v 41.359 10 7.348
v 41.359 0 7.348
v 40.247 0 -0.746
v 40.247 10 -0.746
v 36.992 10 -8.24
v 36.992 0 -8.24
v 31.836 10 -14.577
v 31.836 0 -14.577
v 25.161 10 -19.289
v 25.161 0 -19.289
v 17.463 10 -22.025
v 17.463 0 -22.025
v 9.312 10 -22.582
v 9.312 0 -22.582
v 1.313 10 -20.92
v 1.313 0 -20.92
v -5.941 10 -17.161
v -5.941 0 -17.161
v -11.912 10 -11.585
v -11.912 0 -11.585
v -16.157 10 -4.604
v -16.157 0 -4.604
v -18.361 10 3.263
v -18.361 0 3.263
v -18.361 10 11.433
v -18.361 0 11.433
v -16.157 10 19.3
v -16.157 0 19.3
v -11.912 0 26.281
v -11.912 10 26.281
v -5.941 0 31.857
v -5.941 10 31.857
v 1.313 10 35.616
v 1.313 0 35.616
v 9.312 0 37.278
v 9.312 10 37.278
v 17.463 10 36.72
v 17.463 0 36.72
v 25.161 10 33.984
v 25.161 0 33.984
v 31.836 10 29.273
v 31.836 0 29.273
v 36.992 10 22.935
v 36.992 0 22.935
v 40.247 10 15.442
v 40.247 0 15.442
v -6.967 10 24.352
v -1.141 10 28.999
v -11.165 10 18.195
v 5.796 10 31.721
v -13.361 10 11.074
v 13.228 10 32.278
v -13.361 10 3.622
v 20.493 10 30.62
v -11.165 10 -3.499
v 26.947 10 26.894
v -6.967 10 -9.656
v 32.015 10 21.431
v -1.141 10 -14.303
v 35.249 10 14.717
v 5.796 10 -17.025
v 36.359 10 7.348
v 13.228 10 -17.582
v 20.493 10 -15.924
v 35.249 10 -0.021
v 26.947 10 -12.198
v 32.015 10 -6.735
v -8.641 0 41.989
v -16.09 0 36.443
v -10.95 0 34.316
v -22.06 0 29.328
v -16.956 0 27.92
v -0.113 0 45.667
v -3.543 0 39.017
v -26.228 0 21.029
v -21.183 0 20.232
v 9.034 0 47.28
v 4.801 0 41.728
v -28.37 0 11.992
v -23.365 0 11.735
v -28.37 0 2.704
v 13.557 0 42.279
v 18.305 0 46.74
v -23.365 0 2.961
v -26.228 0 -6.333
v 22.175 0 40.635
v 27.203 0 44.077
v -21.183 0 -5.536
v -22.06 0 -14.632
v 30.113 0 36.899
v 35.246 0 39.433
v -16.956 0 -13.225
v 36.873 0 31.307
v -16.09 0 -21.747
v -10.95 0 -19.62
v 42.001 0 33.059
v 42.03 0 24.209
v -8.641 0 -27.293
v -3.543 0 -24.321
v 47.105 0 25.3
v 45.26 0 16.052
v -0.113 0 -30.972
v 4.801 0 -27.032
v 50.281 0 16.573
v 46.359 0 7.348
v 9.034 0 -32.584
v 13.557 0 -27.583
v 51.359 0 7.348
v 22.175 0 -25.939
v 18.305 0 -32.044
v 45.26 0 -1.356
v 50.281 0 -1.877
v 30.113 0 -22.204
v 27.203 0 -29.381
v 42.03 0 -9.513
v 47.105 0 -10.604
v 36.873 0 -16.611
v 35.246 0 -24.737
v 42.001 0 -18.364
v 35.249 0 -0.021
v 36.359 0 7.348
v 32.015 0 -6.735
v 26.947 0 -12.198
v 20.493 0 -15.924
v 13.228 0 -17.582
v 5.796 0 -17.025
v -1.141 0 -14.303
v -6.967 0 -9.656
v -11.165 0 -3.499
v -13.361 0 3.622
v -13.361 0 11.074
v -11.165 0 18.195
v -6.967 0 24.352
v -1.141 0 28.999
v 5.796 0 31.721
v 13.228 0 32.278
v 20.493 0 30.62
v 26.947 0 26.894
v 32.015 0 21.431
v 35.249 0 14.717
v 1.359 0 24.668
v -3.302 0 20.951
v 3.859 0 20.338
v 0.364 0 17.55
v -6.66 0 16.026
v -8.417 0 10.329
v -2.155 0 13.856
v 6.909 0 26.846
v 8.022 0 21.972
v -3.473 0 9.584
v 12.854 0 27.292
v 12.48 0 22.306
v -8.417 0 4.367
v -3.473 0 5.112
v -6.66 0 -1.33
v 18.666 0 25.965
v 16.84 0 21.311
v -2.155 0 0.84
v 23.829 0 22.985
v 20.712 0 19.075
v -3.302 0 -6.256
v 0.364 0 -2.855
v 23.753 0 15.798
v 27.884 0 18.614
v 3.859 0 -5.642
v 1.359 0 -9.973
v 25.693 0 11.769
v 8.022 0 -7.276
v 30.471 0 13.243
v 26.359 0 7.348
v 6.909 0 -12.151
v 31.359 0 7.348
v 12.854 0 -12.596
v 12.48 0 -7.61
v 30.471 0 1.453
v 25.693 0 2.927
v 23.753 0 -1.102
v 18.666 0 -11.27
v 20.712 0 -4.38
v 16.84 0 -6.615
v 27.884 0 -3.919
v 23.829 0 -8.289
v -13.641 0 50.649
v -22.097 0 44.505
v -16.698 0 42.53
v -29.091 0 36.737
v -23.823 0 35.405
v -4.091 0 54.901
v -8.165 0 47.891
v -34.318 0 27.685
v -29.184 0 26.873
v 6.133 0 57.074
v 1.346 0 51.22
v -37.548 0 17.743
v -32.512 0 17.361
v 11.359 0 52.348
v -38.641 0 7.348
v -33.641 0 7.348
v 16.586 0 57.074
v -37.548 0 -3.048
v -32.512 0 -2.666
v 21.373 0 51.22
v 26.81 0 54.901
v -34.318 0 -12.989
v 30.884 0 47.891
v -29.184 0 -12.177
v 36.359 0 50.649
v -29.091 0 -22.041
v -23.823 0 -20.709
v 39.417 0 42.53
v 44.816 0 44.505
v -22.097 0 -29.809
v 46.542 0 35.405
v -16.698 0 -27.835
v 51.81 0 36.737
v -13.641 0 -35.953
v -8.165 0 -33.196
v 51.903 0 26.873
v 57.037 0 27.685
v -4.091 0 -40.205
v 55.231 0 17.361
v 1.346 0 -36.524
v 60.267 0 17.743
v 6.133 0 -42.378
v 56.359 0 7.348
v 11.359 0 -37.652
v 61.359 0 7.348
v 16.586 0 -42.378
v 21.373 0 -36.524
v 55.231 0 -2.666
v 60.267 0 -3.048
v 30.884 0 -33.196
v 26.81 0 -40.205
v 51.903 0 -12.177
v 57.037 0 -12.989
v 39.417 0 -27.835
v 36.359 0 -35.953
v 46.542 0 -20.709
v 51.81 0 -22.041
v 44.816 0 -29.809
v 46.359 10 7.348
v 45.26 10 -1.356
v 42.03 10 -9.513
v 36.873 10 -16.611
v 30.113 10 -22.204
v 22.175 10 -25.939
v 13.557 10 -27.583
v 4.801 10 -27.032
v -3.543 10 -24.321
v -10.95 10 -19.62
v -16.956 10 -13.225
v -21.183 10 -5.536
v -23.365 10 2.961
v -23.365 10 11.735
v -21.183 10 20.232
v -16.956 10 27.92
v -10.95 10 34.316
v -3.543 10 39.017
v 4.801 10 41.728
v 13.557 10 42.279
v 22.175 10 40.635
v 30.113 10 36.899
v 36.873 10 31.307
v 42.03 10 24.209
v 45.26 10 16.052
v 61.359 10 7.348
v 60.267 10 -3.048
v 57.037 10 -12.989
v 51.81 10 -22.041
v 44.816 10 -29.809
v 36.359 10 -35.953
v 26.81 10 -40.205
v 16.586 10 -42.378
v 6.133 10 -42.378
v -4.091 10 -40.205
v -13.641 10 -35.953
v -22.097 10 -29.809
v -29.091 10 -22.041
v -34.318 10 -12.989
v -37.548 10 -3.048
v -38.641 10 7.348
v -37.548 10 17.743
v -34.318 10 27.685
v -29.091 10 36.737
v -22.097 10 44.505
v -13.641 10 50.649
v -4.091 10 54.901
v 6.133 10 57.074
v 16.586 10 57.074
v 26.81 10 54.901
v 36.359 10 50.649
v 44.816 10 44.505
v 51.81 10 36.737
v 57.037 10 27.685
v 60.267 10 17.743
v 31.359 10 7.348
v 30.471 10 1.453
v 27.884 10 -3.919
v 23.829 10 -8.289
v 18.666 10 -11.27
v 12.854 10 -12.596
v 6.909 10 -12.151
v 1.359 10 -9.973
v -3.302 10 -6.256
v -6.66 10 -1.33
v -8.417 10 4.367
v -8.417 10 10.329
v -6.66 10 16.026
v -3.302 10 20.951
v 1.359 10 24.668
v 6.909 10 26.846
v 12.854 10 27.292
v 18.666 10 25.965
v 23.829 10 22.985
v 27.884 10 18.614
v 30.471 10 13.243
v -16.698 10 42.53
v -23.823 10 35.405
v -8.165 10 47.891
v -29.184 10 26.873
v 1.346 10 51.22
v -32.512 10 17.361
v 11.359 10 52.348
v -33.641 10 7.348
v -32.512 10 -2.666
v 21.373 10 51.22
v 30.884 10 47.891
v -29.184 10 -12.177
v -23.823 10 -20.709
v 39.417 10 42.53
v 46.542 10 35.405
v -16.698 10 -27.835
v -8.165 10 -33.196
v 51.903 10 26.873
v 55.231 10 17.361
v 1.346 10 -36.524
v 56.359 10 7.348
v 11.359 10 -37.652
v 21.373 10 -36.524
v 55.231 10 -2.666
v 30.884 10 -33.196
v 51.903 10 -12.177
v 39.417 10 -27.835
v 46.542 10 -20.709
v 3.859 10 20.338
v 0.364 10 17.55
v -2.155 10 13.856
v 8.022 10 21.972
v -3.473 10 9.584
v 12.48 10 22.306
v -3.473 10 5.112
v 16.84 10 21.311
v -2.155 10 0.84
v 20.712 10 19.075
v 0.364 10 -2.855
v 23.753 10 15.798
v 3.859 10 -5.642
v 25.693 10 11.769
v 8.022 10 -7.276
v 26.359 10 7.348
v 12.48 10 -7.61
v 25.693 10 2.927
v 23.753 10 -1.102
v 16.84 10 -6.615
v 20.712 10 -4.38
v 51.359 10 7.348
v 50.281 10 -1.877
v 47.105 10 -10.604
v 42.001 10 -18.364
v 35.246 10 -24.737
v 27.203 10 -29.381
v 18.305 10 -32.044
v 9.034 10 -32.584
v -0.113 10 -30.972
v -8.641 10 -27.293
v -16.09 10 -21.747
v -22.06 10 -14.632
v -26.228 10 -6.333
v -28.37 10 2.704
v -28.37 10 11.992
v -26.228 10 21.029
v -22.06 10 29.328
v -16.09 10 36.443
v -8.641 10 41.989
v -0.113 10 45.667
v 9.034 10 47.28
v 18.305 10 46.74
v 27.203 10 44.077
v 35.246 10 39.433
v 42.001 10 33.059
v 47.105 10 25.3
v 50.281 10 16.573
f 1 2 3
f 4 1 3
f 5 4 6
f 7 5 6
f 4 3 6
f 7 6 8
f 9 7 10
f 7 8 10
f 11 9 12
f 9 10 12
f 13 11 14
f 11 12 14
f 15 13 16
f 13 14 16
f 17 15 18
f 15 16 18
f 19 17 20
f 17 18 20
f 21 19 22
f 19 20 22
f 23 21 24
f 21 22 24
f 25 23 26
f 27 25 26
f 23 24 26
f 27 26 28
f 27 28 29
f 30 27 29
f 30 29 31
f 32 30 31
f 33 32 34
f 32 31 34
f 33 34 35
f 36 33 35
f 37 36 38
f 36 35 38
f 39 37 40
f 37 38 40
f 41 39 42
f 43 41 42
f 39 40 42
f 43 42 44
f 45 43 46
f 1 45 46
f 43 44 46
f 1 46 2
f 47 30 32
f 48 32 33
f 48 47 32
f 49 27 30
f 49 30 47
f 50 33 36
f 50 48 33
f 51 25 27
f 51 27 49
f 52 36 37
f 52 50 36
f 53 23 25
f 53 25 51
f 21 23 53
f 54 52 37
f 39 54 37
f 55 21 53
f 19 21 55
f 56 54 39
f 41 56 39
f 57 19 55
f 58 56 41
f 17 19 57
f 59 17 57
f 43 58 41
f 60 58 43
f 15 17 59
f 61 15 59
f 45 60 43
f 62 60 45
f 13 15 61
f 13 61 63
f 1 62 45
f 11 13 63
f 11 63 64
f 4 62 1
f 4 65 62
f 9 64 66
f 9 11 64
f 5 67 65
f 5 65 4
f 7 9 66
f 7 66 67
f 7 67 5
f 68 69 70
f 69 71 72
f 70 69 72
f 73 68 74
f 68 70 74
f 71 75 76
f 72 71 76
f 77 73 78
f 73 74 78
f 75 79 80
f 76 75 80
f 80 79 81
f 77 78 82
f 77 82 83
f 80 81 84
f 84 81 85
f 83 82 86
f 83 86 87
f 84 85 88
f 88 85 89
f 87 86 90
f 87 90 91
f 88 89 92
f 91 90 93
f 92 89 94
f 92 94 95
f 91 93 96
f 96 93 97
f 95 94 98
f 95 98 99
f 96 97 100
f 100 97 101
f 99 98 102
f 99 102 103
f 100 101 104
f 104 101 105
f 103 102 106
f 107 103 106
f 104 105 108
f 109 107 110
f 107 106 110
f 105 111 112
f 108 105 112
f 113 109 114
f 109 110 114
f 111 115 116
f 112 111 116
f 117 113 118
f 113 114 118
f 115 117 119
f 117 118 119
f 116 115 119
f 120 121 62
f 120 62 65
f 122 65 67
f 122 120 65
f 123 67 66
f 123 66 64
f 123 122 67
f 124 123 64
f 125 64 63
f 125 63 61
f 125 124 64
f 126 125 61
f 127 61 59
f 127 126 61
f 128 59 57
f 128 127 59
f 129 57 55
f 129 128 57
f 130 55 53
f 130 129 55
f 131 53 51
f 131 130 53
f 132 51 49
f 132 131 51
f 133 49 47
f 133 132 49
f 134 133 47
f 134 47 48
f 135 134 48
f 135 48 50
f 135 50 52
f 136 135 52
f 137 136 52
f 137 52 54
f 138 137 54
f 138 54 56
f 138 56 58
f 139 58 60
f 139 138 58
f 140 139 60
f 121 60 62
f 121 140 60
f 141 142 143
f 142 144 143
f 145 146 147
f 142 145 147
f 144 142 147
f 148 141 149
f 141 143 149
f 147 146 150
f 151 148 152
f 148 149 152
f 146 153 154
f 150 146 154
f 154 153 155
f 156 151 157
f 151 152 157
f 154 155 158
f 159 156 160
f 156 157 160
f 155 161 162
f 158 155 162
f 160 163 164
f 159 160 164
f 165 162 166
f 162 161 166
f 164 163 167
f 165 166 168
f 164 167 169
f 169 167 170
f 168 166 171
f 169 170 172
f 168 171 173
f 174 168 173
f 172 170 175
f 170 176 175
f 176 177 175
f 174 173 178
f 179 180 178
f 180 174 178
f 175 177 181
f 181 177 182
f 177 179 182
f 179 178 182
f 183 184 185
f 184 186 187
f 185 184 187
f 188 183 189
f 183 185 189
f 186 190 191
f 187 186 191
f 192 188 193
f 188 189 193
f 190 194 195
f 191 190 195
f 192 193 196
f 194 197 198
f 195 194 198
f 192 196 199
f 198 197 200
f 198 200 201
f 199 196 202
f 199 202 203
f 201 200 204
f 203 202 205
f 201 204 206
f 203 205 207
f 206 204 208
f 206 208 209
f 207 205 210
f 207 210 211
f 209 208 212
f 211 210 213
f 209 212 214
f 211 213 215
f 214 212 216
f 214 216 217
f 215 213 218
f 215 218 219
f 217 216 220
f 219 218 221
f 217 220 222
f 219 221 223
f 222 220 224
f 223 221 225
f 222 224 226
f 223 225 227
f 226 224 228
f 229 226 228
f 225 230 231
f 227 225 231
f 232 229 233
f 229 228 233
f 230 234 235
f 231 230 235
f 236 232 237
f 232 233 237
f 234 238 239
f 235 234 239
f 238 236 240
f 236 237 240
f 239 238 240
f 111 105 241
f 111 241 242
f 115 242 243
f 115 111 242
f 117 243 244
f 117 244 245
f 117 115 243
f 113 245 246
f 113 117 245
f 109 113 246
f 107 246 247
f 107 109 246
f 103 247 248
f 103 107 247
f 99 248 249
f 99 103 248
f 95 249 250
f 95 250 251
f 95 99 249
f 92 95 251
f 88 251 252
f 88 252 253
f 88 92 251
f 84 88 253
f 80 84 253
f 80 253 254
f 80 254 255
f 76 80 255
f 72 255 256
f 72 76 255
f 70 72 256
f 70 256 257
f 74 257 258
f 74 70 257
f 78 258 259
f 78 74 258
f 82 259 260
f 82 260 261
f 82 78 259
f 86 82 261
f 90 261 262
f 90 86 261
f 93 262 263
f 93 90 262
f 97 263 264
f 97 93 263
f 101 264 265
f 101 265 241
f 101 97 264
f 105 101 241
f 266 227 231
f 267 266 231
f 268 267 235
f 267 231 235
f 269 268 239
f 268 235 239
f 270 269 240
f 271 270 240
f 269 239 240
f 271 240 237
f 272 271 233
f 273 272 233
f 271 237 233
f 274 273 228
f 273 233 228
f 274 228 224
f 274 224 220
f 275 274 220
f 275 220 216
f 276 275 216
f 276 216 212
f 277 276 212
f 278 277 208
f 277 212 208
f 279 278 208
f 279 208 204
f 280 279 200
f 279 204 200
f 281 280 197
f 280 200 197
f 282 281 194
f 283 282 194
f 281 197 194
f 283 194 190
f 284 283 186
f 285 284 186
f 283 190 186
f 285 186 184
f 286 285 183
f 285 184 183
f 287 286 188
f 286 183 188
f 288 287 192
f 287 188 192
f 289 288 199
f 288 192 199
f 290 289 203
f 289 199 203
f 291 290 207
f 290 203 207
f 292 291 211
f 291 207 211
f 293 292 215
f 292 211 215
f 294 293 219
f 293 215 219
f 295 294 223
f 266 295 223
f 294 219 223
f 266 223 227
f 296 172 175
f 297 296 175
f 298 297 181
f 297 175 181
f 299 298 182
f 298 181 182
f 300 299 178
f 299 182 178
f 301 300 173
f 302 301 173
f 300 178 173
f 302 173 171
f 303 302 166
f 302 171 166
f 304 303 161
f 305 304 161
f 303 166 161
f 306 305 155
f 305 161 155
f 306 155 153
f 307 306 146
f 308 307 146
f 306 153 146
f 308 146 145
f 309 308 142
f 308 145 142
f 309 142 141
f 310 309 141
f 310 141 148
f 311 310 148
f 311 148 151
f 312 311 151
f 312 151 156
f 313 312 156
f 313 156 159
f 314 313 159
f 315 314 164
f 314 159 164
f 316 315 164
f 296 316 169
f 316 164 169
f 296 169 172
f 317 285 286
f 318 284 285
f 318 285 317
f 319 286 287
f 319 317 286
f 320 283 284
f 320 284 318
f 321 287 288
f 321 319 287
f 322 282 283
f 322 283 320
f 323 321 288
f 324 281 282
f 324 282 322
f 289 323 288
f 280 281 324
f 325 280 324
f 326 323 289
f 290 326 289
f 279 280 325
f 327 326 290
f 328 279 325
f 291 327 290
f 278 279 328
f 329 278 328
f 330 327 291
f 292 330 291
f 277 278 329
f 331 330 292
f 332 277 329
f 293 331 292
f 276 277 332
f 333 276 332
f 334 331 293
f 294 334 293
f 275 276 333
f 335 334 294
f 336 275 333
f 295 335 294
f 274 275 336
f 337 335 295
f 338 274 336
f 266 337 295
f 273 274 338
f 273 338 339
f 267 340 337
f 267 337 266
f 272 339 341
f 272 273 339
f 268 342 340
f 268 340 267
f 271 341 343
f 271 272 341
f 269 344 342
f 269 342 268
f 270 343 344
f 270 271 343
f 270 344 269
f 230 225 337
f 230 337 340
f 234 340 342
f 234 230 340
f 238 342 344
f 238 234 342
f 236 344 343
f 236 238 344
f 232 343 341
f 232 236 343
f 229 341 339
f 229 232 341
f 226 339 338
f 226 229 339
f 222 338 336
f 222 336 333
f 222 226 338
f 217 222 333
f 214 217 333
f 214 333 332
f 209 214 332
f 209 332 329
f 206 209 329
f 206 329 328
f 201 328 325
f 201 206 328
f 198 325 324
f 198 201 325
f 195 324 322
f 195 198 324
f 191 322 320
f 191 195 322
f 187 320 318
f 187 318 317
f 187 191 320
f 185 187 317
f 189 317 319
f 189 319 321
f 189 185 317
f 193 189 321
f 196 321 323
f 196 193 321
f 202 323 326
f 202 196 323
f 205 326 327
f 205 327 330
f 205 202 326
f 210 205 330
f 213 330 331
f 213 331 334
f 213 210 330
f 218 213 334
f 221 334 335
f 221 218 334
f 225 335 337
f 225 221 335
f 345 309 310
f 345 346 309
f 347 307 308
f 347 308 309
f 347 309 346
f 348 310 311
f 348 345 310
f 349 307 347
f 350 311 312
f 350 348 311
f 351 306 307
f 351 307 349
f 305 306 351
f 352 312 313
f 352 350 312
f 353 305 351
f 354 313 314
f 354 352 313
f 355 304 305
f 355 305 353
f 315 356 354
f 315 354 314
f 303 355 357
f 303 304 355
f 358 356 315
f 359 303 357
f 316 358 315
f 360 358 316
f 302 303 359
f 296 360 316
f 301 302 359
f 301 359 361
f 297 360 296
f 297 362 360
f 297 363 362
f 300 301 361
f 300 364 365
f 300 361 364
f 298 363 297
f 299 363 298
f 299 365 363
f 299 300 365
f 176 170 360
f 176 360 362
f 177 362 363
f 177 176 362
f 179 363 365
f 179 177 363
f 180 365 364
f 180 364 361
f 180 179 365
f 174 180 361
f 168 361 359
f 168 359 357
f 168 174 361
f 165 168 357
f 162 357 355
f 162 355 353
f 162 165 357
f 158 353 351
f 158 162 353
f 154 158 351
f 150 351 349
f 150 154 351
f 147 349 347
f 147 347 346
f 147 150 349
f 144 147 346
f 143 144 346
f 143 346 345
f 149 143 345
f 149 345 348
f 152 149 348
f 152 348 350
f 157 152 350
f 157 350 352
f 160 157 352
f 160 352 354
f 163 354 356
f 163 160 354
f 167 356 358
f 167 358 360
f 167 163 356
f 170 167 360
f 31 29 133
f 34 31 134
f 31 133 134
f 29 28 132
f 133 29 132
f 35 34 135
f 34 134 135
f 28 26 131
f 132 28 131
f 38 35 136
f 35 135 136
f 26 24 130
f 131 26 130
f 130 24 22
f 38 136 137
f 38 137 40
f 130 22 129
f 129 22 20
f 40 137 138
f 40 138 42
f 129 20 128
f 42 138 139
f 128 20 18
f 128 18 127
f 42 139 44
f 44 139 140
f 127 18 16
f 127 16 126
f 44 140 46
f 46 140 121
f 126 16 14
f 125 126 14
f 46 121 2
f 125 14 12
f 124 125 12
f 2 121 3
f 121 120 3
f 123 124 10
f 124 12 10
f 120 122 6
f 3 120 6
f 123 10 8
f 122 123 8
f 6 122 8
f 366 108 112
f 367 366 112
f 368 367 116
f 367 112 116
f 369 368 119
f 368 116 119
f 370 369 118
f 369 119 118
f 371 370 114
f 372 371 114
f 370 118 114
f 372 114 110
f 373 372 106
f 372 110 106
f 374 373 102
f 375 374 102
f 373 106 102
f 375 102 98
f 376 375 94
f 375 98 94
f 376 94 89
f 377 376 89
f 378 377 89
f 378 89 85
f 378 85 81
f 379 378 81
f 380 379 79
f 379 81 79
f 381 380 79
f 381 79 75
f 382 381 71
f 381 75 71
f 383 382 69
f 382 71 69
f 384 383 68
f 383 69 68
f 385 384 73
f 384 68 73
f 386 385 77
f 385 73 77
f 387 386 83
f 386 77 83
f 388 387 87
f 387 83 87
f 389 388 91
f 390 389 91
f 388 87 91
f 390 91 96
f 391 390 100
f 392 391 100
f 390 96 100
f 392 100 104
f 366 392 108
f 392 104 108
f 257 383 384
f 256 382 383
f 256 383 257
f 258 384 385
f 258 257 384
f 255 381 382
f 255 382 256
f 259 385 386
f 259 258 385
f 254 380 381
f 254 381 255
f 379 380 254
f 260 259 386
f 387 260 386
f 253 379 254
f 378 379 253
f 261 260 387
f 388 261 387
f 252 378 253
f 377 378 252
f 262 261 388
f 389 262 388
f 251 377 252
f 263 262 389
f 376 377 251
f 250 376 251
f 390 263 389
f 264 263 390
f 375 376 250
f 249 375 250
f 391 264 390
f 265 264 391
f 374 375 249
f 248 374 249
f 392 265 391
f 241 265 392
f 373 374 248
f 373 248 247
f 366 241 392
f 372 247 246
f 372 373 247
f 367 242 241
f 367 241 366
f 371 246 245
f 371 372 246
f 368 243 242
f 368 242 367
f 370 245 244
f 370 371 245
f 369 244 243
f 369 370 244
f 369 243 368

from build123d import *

# Parameters (mm, degrees)
SKETCH1_R             = 50
SKETCH1_R_2           = 45
BOSS_EXTRUDE3_DEPTH   = 10
SKETCH1_R_3           = 40
SKETCH1_R_4           = 35
BOSS_EXTRUDE3_2_DEPTH = 10
SKETCH1_R_5           = 30
SKETCH1_R_6           = 25
BOSS_EXTRUDE3_3_DEPTH = 10
SKETCH1_R_7           = 20
SKETCH1_R_8           = 15
BOSS_EXTRUDE3_4_DEPTH = 10


with BuildPart() as part:
    # Sketch1 → Boss-Extrude3 (new body)
    with BuildSketch(Plane(origin=(0, 0, 0), x_dir=(1, 0, 0), z_dir=(0, 1, 0))):
        with Locations((11.359496118, -7.347893769)):
            Circle(SKETCH1_R)
        with Locations((11.359496118, -7.347893769)):
            Circle(SKETCH1_R_2, mode=Mode.SUBTRACT)
    extrude(amount=BOSS_EXTRUDE3_DEPTH)


with BuildPart() as body_2:
    # Sketch1 → Boss-Extrude3 2 (new body)
    with BuildSketch(Plane(origin=(0, 0, 0), x_dir=(1, 0, 0), z_dir=(0, 1, 0))):
        with Locations((11.359496118, -7.347893769)):
            Circle(SKETCH1_R_3)
        with Locations((11.359496118, -7.347893769)):
            Circle(SKETCH1_R_4, mode=Mode.SUBTRACT)
    extrude(amount=BOSS_EXTRUDE3_2_DEPTH)


with BuildPart() as body_3:
    # Sketch1 → Boss-Extrude3 3 (new body)
    with BuildSketch(Plane(origin=(0, 0, 0), x_dir=(1, 0, 0), z_dir=(0, 1, 0))):
        with Locations((11.359496118, -7.347893769)):
            Circle(SKETCH1_R_5)
        with Locations((11.359496118, -7.347893769)):
            Circle(SKETCH1_R_6, mode=Mode.SUBTRACT)
    extrude(amount=BOSS_EXTRUDE3_3_DEPTH)


with BuildPart() as body_4:
    # Sketch1 → Boss-Extrude3 4 (new body)
    with BuildSketch(Plane(origin=(0, 0, 0), x_dir=(1, 0, 0), z_dir=(0, 1, 0))):
        with Locations((11.359496118, -7.347893769)):
            Circle(SKETCH1_R_7)
        with Locations((11.359496118, -7.347893769)):
            Circle(SKETCH1_R_8, mode=Mode.SUBTRACT)
    extrude(amount=BOSS_EXTRUDE3_4_DEPTH)


solid = Compound([part.part, body_2.part, body_3.part, body_4.part])
